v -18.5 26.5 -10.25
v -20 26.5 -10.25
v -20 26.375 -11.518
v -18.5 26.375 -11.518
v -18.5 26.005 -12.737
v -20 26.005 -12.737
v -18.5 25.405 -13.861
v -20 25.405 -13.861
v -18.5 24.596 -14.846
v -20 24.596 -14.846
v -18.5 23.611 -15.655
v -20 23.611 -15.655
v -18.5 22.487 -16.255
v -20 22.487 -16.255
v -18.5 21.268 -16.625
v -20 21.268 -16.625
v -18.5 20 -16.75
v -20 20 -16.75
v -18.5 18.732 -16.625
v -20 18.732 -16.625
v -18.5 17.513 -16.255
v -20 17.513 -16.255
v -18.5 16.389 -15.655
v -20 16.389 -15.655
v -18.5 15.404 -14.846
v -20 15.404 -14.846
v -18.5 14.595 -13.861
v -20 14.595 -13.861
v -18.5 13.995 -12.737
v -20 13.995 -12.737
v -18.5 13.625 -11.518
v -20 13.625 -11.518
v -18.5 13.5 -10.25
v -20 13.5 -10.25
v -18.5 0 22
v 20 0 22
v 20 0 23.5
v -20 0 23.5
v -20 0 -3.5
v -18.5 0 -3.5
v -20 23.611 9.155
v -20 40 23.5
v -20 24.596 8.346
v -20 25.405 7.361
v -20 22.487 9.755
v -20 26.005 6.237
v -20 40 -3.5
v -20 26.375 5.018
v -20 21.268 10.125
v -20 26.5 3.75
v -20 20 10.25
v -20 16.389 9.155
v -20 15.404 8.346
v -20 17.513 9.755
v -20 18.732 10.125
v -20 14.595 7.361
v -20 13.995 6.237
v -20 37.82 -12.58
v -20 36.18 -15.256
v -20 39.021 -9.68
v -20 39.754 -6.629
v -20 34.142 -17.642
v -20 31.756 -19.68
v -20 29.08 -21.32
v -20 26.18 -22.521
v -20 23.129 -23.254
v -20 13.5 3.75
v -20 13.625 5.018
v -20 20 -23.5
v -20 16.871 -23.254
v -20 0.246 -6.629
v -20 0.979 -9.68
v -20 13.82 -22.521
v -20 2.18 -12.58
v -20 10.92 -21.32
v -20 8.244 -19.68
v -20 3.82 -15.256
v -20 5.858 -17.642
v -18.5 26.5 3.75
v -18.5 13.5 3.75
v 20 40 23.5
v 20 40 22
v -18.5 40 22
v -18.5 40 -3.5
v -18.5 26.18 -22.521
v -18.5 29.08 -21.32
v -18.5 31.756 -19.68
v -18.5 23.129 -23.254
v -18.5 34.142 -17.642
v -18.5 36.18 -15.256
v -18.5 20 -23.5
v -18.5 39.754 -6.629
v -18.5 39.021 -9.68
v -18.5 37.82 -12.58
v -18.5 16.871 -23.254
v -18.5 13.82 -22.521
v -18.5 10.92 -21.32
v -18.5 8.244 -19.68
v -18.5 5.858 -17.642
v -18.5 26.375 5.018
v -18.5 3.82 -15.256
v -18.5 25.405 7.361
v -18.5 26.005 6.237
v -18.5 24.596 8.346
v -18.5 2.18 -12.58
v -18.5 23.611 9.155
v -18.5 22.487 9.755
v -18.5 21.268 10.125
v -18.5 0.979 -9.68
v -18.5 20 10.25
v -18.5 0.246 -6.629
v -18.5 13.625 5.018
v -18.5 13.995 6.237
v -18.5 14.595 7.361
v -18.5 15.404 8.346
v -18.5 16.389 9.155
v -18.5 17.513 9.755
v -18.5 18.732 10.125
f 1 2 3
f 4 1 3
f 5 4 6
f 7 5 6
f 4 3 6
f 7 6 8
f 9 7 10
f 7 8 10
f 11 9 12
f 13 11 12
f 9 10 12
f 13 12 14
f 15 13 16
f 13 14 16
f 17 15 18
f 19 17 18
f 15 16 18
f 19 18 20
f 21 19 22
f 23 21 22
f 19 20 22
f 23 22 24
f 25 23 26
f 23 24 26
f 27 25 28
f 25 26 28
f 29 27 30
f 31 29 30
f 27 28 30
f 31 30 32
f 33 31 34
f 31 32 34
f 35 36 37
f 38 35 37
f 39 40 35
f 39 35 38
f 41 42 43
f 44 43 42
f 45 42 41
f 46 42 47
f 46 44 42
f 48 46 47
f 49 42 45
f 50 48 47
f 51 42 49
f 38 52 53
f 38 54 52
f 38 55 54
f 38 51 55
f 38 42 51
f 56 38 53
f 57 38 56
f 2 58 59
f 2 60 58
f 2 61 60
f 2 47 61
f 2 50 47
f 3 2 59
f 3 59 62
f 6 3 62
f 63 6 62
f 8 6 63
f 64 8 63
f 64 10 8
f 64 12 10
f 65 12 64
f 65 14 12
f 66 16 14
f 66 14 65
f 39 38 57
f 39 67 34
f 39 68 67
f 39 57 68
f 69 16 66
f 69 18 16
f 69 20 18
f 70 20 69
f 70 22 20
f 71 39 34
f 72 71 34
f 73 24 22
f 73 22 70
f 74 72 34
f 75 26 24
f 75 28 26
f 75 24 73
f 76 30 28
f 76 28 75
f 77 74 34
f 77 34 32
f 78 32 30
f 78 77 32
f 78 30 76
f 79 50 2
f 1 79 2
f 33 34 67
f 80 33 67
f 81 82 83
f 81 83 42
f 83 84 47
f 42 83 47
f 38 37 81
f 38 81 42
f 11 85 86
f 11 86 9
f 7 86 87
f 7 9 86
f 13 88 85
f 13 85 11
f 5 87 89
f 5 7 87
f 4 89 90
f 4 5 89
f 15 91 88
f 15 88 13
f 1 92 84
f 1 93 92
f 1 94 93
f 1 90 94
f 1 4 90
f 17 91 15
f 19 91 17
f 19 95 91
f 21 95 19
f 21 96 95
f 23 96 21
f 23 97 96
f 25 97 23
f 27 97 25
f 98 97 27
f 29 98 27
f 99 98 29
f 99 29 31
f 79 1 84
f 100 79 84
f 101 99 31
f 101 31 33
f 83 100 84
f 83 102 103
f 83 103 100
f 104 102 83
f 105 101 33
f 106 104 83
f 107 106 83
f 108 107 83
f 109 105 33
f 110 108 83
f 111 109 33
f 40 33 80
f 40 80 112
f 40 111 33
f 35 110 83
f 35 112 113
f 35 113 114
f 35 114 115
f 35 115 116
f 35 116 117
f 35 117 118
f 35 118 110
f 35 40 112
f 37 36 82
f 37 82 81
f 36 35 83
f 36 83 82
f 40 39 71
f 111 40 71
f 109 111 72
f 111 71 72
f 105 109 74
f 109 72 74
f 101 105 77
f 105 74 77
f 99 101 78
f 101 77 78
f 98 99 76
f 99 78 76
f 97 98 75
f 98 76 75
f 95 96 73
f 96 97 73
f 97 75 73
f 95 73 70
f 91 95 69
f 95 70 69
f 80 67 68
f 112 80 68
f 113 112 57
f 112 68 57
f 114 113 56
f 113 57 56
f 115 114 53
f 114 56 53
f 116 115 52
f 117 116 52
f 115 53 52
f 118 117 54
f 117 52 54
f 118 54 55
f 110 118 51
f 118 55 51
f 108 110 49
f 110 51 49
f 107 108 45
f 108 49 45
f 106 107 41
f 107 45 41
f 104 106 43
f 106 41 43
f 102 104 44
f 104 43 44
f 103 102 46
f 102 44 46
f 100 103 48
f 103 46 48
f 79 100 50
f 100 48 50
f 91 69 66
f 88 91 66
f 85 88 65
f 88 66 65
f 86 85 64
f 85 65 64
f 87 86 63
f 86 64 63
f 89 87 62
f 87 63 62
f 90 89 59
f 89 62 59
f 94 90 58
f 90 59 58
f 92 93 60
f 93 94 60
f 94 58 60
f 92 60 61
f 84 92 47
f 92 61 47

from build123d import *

# Parameters (mm, degrees)
BOSS_EXTRUDE1_DEPTH = 40
CUT_EXTRUDE1_DEPTH  = 40


with BuildPart() as part:
    # Sketch1 → Boss-Extrude1 (new body)
    with BuildSketch(Plane(origin=(0, 0, 0), x_dir=(1, 0, 0), z_dir=(0, 1, 0))):
        Polygon((-18.5, 23.5), (-18.5, -22), (20, -22), (20, -23.5), (-20, -23.5), (-20, 23.5), align=None)
    extrude(amount=BOSS_EXTRUDE1_DEPTH)

    # Sketch2 → Cut-Extrude1 (cut)
    with BuildSketch(Plane.ZY.offset(20)):
        with BuildLine():
            Line((-23.5, 0), (-3.5, 0))
            ThreePointArc((-3.5, 0), (-17.642135624, 5.857864376), (-23.5, 20))
            Line((-23.5, 20), (-23.5, 0))
        make_face()
        with BuildLine():
            Line((-23.5, 40), (-23.5, 20))
            ThreePointArc((-23.5, 20), (-17.642135624, 34.142135624), (-3.5, 40))
            Line((-3.5, 40), (-23.5, 40))
        make_face()
        with BuildLine():
            Line((-10.25, 13.5), (3.75, 13.5))
            ThreePointArc((3.75, 13.5), (10.25, 20), (3.75, 26.5))
            Line((3.75, 26.5), (-10.25, 26.5))
            ThreePointArc((-10.25, 26.5), (-16.75, 20), (-10.25, 13.5))
        make_face()
    extrude(amount=-CUT_EXTRUDE1_DEPTH, mode=Mode.SUBTRACT)


solid = part.part
